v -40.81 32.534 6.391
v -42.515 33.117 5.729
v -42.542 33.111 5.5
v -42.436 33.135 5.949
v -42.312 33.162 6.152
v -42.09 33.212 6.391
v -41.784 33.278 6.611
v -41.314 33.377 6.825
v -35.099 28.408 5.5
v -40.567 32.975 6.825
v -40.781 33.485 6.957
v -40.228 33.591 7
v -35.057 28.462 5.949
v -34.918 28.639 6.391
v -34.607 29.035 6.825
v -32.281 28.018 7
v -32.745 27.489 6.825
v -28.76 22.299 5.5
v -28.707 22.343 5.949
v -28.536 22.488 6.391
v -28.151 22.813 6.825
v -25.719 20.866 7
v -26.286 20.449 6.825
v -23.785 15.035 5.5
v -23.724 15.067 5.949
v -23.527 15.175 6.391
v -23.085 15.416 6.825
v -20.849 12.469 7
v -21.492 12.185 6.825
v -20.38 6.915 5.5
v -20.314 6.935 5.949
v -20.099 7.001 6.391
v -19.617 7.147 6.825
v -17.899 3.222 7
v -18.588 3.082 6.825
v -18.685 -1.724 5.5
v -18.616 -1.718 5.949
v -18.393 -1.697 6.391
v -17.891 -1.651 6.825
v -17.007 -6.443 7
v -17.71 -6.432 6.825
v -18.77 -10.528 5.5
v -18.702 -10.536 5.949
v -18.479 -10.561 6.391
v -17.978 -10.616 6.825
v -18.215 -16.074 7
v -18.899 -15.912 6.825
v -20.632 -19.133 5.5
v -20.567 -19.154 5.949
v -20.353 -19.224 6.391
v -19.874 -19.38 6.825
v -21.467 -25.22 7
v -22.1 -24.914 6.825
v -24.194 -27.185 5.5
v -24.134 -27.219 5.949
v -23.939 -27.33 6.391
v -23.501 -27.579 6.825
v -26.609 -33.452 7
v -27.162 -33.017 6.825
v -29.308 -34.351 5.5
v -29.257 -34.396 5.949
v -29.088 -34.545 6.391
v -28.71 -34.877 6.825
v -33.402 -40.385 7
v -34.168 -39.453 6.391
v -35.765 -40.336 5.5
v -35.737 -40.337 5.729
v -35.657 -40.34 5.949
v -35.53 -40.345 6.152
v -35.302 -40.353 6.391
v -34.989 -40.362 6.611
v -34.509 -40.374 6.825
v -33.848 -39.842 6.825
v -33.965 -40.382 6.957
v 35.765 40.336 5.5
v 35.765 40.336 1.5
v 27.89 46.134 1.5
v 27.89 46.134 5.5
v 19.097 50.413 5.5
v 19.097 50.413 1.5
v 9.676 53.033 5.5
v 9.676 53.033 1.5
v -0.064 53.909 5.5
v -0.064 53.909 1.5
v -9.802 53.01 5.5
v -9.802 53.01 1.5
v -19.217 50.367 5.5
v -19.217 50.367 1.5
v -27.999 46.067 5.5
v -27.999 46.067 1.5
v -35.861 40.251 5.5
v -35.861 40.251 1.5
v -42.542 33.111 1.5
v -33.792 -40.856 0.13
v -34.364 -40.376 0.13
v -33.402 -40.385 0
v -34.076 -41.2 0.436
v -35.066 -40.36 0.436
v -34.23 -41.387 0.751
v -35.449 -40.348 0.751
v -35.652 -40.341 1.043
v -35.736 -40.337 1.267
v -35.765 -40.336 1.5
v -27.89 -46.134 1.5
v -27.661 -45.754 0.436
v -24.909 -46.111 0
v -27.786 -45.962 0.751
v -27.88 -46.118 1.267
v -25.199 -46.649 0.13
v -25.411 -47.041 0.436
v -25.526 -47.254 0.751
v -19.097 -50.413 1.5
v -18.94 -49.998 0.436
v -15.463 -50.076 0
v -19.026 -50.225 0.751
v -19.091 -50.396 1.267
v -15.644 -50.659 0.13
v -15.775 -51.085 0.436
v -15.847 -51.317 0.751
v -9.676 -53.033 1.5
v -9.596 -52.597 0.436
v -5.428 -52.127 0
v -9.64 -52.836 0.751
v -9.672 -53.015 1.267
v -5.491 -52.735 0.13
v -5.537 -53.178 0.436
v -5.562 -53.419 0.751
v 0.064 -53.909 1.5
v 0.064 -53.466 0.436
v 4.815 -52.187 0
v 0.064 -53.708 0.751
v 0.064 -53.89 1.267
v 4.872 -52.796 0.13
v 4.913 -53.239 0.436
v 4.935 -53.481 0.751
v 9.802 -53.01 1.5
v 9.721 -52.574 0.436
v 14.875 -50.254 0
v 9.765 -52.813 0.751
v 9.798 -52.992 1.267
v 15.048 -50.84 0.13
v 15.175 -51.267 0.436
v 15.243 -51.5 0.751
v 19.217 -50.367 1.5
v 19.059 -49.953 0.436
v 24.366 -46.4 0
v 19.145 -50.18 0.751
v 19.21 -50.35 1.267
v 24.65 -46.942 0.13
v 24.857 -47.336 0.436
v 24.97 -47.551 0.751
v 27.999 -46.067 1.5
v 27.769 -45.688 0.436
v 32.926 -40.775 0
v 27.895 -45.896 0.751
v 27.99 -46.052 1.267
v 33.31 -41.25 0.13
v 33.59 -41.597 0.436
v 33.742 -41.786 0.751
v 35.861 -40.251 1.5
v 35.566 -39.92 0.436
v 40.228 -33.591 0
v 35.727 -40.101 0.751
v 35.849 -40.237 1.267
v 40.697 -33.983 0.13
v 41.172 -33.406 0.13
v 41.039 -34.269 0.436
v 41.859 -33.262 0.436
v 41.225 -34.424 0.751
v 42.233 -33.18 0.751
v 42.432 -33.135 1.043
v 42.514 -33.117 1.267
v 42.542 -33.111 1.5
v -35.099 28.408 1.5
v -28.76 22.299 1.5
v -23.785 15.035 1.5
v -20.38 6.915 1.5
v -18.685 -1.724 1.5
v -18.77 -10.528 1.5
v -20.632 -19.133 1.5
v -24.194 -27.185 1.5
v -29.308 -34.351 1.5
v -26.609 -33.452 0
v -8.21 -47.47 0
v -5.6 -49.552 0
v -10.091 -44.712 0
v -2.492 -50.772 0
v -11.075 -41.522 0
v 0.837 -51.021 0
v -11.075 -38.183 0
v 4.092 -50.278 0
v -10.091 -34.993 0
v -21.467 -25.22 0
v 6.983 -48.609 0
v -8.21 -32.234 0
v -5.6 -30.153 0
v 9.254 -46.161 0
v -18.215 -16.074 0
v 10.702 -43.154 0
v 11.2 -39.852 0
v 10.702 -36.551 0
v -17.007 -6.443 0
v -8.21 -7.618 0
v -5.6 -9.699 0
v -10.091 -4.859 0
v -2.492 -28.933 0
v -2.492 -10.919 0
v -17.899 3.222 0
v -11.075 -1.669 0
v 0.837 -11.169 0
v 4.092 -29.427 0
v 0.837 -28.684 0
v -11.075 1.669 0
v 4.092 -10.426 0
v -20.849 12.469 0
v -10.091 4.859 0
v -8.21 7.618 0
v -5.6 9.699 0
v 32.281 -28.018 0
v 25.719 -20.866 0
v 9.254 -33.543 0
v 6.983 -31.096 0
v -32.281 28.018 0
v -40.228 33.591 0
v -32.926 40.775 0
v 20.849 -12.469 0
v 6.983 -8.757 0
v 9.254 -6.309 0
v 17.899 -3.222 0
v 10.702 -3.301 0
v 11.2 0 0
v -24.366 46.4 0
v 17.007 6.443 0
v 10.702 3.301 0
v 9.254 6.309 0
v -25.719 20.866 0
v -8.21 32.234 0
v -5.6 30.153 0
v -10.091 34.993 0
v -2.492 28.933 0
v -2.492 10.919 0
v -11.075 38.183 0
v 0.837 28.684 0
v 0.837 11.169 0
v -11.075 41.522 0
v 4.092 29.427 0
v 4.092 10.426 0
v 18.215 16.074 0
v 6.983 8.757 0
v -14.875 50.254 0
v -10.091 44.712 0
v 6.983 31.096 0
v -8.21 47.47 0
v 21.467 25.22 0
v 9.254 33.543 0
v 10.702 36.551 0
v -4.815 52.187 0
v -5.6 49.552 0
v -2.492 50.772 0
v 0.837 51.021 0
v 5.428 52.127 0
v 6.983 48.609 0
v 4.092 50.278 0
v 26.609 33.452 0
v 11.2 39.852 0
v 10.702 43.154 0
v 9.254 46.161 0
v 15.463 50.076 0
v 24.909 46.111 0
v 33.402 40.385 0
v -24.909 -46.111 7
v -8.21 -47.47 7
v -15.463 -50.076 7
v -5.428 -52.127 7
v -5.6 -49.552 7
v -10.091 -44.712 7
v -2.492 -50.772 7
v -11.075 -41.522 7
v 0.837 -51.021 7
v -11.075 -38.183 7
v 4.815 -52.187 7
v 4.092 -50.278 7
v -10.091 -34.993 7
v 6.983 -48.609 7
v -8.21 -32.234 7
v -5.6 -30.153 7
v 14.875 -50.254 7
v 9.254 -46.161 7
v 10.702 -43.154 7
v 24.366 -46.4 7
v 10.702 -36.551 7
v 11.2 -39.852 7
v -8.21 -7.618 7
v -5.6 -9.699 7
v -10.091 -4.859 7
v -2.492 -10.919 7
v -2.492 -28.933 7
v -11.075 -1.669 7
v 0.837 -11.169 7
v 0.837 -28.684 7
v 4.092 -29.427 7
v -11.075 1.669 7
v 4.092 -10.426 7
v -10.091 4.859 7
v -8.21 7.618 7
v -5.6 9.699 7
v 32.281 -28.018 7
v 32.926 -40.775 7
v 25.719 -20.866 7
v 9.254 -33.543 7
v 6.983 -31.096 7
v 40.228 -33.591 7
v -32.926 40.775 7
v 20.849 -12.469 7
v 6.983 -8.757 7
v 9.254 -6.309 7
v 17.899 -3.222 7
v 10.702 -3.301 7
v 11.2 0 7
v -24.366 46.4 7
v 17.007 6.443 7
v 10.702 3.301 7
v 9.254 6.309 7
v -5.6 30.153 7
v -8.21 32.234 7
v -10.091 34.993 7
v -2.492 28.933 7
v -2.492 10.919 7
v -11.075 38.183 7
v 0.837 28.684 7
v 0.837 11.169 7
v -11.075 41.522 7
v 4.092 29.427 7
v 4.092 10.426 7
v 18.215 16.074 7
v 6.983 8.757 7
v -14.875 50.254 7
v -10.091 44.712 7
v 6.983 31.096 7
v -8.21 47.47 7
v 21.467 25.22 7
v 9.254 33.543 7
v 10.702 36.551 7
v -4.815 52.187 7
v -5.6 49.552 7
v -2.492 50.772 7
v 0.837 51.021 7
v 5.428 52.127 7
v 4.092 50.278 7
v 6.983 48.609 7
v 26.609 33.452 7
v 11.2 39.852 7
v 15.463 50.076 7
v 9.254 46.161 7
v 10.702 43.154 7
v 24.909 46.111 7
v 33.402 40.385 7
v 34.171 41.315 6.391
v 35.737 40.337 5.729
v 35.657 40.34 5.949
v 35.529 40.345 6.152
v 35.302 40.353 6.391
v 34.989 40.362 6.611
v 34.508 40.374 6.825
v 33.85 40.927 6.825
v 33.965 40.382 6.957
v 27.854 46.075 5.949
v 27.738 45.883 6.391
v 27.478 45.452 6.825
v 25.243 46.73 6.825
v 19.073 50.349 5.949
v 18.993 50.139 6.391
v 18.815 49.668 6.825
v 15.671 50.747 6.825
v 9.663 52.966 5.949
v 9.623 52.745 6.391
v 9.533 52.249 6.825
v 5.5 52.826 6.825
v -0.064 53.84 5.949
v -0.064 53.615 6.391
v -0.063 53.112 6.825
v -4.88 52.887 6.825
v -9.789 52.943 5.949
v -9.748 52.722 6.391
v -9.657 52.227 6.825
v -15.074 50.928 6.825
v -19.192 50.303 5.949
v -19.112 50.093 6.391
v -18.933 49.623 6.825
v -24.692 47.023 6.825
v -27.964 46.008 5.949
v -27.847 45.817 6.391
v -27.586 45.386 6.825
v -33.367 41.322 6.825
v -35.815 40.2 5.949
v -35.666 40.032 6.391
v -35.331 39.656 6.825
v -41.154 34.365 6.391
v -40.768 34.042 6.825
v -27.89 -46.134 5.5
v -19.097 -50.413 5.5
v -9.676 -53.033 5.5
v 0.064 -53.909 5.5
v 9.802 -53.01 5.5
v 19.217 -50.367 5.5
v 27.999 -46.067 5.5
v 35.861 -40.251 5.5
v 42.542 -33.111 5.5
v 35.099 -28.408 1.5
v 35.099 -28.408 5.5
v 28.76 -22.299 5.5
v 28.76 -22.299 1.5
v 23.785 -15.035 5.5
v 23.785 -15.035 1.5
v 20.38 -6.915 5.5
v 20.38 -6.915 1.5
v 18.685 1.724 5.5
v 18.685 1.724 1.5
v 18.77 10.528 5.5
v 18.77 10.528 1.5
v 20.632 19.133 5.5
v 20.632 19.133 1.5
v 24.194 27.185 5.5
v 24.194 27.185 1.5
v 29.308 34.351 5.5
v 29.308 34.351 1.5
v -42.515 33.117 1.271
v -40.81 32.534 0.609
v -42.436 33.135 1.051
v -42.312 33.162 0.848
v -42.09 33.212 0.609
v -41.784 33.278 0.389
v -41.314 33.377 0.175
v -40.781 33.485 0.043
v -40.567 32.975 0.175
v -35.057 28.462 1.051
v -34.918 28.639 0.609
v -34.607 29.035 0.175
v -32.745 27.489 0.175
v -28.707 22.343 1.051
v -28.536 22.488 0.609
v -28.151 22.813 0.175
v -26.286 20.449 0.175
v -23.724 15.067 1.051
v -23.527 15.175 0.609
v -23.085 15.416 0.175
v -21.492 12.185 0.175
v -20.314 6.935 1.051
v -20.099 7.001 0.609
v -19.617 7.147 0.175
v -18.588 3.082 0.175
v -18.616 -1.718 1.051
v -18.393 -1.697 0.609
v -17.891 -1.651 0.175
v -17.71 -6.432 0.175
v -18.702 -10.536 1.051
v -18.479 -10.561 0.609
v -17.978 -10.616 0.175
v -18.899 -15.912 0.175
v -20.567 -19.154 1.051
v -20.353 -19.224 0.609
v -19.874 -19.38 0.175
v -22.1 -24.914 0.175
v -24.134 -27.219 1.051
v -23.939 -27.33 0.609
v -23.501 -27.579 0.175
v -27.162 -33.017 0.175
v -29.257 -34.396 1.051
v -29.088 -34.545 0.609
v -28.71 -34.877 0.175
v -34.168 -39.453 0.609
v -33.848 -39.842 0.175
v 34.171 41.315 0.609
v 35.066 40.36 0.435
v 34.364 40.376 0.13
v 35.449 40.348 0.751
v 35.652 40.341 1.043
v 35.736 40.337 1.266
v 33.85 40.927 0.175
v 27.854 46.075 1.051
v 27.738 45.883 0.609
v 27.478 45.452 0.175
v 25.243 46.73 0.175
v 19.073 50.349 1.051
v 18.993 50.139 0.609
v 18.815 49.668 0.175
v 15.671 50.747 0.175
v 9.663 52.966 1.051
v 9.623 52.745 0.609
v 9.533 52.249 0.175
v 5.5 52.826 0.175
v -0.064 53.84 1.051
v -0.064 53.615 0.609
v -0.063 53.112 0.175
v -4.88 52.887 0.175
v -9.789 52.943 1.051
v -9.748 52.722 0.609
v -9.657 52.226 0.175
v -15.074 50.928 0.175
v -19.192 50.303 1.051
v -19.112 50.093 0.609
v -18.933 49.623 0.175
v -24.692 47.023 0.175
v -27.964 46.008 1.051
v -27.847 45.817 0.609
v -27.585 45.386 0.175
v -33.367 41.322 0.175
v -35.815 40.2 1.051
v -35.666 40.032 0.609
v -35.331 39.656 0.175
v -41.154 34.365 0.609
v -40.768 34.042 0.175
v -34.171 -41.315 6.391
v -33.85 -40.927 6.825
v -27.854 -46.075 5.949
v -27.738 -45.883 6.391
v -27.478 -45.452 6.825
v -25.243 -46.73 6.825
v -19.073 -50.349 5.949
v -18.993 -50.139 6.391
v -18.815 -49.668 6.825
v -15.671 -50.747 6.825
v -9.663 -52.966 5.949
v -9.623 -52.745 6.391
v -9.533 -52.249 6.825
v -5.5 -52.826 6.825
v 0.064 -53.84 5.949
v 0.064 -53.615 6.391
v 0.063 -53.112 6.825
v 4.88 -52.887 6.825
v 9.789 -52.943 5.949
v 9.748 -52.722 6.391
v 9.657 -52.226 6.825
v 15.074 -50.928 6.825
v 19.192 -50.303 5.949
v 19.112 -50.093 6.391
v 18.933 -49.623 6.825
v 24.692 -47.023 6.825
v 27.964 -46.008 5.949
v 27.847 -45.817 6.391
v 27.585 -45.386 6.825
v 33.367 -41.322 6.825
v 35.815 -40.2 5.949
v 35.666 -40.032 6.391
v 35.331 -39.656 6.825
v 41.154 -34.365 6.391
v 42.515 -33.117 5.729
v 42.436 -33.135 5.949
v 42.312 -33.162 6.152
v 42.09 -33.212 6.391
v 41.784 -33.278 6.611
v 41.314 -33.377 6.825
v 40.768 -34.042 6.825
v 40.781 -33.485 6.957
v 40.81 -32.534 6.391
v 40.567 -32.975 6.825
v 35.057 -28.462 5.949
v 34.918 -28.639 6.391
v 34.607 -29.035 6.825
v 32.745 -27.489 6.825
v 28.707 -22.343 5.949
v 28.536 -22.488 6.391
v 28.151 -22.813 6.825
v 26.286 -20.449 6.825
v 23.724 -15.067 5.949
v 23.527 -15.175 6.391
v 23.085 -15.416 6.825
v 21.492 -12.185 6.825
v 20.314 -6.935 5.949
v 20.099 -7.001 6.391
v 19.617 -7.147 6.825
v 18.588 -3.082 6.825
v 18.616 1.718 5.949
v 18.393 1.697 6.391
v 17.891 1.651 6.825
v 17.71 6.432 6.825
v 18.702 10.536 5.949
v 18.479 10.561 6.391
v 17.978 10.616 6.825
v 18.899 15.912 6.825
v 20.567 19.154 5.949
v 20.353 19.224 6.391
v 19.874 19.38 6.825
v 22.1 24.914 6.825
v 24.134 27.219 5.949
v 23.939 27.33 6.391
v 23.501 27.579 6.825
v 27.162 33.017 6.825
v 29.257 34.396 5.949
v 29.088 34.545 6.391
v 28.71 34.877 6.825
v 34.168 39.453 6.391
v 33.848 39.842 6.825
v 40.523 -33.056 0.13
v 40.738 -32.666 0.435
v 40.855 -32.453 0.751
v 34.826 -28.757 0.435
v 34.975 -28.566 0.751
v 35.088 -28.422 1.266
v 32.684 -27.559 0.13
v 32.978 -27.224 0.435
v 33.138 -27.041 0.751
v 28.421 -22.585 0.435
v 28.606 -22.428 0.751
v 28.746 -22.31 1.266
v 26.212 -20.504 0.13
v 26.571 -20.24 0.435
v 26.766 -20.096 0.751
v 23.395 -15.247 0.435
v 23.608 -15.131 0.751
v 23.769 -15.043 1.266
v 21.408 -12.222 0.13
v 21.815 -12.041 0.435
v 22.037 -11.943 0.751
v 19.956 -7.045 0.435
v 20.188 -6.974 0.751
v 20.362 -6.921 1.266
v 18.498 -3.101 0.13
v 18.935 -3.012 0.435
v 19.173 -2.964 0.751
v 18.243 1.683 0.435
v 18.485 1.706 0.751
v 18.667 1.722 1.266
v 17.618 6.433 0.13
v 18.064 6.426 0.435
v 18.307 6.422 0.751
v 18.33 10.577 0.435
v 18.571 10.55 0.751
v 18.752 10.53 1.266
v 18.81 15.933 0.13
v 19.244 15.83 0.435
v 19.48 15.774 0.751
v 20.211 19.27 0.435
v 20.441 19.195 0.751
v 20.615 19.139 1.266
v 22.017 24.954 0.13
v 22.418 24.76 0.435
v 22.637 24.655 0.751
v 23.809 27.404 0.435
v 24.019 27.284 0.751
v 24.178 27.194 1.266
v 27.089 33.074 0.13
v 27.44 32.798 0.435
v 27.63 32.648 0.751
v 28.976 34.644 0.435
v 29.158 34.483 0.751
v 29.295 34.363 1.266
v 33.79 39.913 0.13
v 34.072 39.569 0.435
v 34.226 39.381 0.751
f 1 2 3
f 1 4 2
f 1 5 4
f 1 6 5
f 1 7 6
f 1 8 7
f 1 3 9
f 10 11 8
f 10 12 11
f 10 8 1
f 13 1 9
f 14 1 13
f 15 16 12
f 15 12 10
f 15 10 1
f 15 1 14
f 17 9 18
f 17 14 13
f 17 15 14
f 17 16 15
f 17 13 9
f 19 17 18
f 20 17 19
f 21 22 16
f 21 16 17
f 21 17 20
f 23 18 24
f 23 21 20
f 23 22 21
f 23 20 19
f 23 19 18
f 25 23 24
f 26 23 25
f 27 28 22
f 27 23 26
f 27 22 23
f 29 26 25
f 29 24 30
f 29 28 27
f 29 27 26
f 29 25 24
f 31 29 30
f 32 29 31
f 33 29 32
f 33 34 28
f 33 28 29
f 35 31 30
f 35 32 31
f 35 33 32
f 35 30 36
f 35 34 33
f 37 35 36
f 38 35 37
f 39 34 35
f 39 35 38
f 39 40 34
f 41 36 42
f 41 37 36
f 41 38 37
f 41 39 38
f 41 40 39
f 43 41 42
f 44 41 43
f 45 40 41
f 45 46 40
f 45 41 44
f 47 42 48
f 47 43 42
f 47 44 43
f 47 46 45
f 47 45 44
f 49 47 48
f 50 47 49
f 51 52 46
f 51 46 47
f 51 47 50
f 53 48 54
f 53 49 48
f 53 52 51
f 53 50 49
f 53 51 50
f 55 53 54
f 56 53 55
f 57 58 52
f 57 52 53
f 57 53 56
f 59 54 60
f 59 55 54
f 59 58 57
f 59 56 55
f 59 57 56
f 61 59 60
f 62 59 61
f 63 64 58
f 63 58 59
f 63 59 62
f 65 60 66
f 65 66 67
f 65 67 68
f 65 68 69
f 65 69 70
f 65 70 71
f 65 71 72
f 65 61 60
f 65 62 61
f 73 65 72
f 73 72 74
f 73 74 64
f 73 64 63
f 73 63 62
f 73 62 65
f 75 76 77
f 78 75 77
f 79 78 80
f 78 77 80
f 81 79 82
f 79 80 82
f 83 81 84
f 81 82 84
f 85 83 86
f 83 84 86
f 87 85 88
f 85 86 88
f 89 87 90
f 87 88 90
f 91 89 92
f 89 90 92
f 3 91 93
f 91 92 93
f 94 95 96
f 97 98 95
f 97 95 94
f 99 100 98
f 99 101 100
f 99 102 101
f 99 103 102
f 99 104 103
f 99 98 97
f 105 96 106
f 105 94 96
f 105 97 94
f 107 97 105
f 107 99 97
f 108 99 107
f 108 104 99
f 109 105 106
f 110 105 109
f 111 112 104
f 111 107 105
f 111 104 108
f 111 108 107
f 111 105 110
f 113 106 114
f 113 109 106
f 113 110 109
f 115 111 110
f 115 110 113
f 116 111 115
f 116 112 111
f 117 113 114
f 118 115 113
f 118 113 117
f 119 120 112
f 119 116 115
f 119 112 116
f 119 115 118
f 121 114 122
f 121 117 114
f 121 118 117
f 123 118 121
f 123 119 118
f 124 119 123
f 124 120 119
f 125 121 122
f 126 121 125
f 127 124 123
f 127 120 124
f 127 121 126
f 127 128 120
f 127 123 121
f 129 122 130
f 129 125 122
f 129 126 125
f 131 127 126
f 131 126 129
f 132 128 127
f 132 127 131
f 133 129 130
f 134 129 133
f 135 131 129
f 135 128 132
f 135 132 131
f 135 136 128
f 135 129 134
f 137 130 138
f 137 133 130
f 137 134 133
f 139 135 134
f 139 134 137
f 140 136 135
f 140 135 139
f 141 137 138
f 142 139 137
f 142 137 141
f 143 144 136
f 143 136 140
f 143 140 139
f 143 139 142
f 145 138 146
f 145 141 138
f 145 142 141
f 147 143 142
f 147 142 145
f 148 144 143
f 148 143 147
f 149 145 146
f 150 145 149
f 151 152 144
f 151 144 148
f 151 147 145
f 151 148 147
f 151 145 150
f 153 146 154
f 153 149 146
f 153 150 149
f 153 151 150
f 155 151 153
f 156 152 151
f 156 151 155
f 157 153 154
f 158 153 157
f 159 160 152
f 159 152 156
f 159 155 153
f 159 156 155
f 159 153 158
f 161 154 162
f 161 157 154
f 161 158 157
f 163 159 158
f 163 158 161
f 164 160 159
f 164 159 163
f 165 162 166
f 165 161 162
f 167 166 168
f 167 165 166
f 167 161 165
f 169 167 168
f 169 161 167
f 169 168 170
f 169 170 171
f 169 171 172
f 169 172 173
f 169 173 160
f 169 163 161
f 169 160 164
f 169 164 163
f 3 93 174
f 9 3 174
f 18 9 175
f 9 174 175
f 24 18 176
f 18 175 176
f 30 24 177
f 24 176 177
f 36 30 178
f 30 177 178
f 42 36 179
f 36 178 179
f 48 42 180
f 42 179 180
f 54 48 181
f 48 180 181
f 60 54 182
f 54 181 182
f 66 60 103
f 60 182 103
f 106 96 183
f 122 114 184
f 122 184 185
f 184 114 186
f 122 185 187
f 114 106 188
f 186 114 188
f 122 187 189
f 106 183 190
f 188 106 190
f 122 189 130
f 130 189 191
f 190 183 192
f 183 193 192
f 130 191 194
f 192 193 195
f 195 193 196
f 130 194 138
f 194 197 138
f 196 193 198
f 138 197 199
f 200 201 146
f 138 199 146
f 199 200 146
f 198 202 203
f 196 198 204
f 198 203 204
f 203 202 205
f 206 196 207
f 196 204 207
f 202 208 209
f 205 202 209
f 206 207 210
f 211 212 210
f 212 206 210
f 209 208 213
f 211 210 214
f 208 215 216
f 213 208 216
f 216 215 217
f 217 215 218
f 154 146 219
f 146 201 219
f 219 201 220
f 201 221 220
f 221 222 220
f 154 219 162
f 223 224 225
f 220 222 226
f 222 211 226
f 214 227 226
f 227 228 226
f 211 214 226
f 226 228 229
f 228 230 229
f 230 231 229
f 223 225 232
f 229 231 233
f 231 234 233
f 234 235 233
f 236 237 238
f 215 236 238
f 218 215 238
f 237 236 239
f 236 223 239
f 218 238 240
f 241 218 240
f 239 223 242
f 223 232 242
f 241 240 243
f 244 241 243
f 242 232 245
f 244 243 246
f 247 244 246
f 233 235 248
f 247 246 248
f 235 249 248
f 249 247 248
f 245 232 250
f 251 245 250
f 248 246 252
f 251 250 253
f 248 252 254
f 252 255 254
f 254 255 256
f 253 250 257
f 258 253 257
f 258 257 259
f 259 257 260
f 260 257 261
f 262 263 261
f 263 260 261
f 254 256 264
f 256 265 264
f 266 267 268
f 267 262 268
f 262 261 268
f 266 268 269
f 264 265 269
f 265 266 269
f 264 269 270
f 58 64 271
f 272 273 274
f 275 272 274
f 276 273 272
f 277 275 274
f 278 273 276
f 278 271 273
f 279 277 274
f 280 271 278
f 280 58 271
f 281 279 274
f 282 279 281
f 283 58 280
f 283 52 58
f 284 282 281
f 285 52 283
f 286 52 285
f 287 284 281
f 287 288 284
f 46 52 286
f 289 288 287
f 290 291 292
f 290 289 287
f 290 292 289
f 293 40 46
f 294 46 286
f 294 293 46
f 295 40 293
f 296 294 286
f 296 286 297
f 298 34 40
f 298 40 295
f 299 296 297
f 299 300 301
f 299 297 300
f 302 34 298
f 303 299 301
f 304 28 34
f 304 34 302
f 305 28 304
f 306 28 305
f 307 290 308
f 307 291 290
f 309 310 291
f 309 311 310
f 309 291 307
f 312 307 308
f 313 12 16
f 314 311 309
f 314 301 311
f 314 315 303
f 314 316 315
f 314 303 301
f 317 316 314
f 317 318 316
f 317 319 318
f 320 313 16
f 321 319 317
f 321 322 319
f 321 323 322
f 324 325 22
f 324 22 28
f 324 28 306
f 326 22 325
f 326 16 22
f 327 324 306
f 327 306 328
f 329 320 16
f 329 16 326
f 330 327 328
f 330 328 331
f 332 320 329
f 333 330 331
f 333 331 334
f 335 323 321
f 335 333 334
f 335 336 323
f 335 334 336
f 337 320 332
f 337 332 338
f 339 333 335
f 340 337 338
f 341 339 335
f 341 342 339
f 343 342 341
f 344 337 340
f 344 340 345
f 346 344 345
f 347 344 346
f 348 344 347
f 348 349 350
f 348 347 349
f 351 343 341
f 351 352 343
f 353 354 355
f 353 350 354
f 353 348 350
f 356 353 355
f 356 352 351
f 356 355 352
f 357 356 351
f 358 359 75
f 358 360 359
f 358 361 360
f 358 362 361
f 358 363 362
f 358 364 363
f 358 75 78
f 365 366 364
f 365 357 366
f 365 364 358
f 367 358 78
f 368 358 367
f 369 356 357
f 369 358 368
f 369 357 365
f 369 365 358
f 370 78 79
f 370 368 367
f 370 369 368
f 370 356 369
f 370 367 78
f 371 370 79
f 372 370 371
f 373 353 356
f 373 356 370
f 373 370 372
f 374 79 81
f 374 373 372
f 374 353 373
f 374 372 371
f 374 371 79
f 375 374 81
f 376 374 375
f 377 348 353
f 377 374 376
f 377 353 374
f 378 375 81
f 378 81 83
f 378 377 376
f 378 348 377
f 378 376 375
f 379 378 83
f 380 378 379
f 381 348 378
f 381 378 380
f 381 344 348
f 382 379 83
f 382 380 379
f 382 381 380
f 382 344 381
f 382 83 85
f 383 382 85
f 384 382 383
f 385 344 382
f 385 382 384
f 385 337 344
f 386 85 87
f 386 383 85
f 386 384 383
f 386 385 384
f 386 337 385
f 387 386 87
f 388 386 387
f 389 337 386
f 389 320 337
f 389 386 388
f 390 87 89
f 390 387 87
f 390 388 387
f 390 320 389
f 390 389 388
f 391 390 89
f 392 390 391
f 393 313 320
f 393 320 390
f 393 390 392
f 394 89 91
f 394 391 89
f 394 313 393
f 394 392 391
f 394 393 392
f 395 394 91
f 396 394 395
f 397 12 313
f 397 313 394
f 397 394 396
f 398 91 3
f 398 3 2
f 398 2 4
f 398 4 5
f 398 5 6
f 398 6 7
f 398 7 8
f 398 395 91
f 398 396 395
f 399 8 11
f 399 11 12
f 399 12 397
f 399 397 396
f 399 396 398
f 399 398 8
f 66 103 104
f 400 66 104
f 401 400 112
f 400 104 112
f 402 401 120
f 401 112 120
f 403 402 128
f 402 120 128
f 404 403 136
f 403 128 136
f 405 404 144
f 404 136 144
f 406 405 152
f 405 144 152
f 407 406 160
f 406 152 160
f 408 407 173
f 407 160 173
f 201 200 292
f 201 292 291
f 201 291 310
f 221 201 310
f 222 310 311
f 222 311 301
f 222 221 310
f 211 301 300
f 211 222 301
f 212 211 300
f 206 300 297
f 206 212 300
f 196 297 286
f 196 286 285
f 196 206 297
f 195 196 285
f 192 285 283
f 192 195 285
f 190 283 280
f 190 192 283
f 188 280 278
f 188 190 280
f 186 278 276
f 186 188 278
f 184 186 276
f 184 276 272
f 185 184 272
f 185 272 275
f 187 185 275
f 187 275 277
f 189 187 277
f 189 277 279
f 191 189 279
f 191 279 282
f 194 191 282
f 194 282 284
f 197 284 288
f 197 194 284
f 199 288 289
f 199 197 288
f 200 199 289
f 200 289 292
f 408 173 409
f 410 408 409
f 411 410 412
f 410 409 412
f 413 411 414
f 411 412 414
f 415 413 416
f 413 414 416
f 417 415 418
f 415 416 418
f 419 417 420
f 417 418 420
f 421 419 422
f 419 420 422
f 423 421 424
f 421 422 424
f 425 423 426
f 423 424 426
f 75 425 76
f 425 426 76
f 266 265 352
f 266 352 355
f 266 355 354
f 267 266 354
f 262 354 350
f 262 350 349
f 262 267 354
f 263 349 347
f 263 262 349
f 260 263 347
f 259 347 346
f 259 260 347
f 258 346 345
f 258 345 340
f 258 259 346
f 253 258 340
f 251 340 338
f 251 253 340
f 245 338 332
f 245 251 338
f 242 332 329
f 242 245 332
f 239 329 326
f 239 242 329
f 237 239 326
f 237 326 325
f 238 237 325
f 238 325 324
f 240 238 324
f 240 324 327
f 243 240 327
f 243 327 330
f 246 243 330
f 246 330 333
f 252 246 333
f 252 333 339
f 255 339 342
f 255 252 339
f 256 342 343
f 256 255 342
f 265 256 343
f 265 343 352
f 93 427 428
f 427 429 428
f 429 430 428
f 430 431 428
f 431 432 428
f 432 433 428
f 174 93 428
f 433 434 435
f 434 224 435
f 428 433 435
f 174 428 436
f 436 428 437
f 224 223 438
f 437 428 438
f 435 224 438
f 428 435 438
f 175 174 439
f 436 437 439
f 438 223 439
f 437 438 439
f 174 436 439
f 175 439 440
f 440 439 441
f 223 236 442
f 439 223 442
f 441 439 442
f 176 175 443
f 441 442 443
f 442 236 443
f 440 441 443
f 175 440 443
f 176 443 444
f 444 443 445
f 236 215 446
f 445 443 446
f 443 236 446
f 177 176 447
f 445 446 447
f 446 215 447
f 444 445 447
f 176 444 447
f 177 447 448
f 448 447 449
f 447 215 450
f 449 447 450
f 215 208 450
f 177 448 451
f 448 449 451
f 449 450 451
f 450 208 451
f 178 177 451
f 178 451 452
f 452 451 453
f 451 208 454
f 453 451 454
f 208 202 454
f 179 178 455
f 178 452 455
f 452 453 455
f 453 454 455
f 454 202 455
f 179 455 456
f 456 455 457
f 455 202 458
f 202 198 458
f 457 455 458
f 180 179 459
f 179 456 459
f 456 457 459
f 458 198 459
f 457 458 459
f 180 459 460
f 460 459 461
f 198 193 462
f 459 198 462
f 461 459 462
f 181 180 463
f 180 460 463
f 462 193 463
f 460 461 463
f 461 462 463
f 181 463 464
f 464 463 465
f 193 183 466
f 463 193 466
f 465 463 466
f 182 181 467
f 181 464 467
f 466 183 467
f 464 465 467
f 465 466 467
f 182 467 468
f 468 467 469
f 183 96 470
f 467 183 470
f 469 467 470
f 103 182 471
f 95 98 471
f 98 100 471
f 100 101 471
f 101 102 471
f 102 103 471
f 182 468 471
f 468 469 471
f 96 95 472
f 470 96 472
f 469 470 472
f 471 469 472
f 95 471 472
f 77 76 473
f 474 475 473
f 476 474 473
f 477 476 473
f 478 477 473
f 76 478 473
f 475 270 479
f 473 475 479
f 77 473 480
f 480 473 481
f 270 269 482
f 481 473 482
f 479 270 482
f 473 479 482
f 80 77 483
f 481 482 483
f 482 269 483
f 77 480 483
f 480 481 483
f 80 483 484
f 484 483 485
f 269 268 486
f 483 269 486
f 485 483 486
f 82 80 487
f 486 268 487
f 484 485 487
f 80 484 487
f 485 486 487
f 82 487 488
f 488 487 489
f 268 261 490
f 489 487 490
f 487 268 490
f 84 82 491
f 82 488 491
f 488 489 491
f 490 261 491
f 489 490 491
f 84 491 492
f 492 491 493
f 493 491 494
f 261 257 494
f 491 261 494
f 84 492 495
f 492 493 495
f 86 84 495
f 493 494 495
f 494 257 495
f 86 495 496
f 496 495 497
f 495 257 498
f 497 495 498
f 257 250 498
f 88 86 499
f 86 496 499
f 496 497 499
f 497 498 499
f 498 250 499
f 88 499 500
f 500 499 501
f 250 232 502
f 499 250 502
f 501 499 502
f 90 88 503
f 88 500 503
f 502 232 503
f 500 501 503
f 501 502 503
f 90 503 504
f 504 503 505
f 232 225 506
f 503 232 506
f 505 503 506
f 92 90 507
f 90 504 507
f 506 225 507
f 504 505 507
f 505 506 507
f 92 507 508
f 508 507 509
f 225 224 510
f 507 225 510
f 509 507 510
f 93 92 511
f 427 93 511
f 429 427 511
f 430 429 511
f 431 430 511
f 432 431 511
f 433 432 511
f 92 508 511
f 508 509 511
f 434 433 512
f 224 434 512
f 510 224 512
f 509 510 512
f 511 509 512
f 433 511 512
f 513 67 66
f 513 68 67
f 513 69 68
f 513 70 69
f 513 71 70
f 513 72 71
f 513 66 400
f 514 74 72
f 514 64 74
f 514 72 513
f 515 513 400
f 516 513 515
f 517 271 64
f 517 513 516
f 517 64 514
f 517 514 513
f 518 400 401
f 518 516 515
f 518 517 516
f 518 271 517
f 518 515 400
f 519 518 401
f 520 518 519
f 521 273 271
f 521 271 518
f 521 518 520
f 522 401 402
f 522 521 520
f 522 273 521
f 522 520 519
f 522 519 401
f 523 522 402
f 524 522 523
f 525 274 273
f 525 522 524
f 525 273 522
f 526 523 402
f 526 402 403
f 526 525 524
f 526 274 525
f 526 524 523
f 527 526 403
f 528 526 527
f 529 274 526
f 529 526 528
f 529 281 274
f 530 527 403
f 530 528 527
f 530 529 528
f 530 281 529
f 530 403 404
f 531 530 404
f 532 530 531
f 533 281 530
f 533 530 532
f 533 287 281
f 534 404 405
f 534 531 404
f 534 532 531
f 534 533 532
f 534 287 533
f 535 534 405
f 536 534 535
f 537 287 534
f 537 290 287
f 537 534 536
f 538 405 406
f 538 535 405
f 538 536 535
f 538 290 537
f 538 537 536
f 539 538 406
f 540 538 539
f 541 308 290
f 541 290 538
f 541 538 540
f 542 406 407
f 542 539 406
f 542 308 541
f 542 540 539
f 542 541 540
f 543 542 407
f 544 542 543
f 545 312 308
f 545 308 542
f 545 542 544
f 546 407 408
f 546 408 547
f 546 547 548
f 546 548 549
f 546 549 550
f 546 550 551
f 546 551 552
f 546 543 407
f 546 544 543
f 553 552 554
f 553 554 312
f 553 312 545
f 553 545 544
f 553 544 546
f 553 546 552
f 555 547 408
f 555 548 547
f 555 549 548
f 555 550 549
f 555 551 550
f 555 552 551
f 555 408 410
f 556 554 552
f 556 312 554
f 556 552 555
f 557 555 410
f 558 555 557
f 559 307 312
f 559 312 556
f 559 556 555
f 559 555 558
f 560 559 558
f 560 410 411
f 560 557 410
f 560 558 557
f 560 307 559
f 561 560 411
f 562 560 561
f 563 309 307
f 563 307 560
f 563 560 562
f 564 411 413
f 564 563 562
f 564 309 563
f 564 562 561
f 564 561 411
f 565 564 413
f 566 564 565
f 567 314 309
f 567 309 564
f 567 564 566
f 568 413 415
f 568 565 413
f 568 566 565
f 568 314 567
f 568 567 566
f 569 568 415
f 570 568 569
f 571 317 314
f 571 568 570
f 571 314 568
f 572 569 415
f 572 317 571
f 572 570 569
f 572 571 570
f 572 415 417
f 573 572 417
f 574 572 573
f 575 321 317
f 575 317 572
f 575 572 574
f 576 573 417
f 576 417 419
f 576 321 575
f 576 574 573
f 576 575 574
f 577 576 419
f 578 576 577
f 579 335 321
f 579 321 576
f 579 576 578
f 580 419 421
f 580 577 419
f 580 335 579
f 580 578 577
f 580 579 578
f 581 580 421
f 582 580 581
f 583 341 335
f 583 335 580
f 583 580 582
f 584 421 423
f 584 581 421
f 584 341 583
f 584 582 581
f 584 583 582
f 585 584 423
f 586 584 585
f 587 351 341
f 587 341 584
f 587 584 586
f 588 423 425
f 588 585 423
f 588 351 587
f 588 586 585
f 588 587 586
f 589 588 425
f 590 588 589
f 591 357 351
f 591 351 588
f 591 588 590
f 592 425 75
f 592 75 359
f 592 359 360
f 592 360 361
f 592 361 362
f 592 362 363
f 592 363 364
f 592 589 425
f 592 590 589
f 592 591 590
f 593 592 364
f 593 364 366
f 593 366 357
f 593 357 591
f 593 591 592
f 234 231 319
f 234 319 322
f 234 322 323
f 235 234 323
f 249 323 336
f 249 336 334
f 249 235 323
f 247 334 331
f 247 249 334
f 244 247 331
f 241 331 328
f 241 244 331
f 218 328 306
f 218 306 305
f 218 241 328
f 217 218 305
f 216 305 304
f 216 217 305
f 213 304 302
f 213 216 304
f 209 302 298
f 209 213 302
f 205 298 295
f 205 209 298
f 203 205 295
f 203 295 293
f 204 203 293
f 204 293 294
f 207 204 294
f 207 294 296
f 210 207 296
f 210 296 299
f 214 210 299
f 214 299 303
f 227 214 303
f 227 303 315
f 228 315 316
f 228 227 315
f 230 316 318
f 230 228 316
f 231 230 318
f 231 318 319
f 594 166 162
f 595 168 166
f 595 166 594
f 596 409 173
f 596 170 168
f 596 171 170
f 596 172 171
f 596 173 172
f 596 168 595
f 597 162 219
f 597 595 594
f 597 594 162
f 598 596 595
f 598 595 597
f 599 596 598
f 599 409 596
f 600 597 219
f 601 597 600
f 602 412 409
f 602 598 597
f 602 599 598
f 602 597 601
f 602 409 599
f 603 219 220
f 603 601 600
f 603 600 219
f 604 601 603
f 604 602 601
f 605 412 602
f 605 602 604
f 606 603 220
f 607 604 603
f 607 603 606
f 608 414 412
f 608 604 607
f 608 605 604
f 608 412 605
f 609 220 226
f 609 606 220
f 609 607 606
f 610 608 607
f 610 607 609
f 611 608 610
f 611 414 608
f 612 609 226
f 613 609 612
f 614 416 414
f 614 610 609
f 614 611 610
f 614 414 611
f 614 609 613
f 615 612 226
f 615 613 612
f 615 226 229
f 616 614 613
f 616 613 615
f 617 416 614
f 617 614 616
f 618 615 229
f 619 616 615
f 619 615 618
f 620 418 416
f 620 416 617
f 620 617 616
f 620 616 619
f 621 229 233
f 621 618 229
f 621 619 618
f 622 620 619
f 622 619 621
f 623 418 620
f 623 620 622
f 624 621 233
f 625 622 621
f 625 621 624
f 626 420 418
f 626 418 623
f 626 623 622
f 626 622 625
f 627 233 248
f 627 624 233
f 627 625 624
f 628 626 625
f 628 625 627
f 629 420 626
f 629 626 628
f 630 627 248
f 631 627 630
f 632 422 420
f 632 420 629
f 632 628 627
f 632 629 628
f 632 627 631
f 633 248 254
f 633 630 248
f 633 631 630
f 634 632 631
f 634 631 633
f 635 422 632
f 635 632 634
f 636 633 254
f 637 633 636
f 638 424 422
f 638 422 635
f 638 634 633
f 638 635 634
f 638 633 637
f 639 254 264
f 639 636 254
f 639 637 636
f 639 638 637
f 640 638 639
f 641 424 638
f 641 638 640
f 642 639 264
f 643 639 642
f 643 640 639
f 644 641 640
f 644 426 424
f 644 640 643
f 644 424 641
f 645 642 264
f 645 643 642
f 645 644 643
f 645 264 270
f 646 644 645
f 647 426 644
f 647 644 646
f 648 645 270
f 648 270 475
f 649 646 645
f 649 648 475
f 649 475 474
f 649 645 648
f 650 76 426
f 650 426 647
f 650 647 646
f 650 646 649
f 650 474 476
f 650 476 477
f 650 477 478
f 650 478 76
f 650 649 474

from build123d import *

# Parameters (mm, degrees)
F0_R     = 11.2
F1_DEPTH = 7
F2_R     = 1.5
F3_R     = 1.5


with BuildPart() as f1:
    # F0 (on Top) → F1 (new body)
    with BuildSketch(Plane.XY):
        with BuildLine():
            ThreePointArc((-42.542229, 33.110583), (-18.684815, -1.724094), (-35.765112, -40.336196))
            ThreePointArc((-35.765112, -40.336196), (4.953252, -53.680697), (42.542229, -33.110583))
            ThreePointArc((42.542229, -33.110583), (18.684815, 1.724094), (35.765112, 40.336196))
            ThreePointArc((35.765112, 40.336196), (-4.953252, 53.680697), (-42.542229, 33.110583))
        make_face()
        with Locations((0, -39.85231)):
            Circle(F0_R, mode=Mode.SUBTRACT)
        Circle(F0_R, mode=Mode.SUBTRACT)
        with Locations((0, 39.85231)):
            Circle(F0_R, mode=Mode.SUBTRACT)
    extrude(amount=F1_DEPTH)

    # F2
    f2_edges = [f1.edges().sort_by_distance(p)[0] for p in [
        (18.684815, 1.724094, 7),
        (4.953252, -53.680697, 7),
        (-18.684815, -1.724094, 7),
        (-4.953252, 53.680697, 7),
    ]]
    fillet(f2_edges, radius=F2_R)

    # F3
    f3_edges = [f1.edges().sort_by_distance(p)[0] for p in [
        (4.953252, -53.680697, 0),
        (18.684815, 1.724094, 0),
        (-4.953252, 53.680697, 0),
        (-18.684815, -1.724094, 0),
    ]]
    fillet(f3_edges, radius=F3_R)


solid = f1.part
